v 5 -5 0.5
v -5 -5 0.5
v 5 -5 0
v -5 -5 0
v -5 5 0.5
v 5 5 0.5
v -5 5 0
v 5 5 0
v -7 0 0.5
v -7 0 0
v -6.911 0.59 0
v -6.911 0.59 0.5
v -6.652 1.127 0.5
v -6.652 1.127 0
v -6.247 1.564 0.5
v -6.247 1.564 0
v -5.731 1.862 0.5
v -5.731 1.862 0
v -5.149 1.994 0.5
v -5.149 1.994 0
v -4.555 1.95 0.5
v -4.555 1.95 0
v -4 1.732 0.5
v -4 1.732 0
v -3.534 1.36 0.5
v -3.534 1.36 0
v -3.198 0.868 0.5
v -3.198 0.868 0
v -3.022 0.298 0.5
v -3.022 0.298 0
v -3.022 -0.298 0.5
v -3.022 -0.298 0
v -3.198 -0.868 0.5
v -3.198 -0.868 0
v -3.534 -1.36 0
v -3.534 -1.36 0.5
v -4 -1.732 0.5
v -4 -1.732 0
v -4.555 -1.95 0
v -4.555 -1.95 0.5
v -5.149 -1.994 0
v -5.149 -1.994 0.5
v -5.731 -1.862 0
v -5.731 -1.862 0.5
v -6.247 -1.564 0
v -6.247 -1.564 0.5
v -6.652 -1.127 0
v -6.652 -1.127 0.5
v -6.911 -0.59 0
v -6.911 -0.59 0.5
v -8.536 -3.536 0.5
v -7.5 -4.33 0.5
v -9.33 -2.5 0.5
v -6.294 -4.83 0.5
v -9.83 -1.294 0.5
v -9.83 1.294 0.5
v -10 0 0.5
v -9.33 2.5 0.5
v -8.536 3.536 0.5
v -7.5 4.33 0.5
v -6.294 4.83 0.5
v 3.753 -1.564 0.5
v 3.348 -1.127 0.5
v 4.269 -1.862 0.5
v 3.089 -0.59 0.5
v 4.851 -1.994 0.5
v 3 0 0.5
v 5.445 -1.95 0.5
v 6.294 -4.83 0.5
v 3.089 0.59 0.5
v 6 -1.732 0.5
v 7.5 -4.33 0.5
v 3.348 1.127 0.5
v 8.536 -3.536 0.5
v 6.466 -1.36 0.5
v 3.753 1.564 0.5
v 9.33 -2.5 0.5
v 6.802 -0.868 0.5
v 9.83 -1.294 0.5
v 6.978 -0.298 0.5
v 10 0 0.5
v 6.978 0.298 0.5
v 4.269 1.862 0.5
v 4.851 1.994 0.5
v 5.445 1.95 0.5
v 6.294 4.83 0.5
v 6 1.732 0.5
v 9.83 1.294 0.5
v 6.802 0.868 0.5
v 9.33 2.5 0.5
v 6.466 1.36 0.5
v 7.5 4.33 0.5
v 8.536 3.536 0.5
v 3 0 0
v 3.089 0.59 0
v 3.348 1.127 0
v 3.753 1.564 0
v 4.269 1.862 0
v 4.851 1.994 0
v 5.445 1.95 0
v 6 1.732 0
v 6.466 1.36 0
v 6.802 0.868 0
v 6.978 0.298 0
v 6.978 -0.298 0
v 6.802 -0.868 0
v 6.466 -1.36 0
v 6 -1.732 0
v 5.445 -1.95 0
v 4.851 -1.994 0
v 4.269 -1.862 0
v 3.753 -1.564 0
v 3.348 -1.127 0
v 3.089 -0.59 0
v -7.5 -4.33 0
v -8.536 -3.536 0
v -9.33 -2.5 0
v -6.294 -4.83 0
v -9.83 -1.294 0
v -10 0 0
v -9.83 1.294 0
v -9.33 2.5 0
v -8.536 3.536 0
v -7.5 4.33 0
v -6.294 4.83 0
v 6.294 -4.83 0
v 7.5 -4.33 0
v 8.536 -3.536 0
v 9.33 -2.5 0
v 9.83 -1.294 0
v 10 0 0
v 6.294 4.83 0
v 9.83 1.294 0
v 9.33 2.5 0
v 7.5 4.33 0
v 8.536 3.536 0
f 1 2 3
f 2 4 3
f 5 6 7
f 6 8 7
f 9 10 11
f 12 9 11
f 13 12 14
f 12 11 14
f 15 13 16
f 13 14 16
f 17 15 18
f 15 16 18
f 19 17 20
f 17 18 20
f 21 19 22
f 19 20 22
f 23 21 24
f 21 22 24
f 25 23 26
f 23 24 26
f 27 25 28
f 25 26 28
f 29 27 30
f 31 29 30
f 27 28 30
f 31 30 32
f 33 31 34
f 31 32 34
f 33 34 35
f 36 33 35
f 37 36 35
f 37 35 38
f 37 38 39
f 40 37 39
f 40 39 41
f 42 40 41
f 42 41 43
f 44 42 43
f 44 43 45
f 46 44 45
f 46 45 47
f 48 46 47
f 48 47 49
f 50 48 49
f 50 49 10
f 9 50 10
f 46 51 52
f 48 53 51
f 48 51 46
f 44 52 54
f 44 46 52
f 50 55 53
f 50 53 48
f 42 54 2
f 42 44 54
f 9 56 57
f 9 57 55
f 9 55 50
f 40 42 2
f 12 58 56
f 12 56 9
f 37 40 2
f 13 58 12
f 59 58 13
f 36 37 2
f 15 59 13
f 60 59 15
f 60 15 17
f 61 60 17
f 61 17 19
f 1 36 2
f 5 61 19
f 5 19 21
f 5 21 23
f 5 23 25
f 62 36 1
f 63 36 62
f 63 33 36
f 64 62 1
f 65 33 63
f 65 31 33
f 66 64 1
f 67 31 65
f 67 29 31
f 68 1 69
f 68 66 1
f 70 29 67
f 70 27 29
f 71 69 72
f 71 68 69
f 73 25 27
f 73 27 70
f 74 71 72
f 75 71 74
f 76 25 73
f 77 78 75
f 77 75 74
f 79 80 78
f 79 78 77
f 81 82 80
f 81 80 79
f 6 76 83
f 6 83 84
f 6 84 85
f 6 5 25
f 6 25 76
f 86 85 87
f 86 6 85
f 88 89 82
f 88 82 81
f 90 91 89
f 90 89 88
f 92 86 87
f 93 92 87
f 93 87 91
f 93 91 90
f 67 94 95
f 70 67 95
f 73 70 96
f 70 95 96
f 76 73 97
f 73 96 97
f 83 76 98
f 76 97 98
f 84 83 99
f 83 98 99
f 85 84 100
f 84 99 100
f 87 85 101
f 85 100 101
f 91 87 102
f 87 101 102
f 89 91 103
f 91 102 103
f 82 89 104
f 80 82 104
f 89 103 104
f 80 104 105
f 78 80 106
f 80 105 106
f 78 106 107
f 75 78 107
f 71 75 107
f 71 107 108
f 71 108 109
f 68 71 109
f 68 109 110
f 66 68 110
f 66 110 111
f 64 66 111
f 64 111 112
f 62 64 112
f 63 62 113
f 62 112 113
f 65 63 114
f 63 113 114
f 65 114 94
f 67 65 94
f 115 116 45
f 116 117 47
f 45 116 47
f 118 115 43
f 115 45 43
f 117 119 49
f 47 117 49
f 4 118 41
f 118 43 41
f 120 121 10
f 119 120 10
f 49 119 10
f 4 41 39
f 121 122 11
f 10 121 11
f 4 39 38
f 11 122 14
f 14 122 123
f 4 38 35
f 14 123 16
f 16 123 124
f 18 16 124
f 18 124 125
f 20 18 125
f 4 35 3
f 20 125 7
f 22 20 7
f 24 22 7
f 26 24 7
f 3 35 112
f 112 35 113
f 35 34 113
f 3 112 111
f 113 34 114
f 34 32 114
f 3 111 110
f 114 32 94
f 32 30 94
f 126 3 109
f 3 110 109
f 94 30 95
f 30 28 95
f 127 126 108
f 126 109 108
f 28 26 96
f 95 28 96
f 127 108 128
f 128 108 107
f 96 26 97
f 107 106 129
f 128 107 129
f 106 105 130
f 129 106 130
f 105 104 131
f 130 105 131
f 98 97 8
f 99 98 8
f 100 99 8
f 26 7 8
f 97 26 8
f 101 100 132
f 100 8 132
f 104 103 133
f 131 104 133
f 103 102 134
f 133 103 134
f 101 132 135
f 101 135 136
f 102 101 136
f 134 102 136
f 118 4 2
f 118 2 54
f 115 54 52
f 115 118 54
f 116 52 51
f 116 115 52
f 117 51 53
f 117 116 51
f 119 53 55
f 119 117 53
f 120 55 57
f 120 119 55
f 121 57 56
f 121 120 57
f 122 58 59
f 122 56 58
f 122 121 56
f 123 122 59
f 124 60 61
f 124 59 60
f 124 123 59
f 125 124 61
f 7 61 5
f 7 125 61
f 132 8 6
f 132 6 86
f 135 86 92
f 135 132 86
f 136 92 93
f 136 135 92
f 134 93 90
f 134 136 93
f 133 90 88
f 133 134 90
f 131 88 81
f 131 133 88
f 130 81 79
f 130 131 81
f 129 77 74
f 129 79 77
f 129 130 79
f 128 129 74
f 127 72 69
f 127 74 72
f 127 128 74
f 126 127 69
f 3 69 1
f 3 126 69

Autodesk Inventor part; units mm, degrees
ref_plane "YZ Plane" through (0, 0, 0) normal (1, 0, 0) x (0, 1, 0)
ref_plane "XZ Plane" through (0, 0, 0) normal (0, 1, 0) x (-1, 0, 0)
ref_plane "XY Plane" through (0, 0, 0) normal (0, 0, 1) x (1, 0, 0)
sketch "Náčrt1" plane through (0, 0, 0) normal (0, 0, 1) x (1, 0, 0)
  line L0 (-5, 0) -> (5, 0) construction
  line L1 (-5, -5) -> (5, -5)
  line L2 (5, 5) -> (-5, 5)
  arc A0 (-5, 5) -> (-5, -5) centre (-5, 0) ccw
  arc A1 (5, -5) -> (5, 5) centre (5, 0) ccw
  point P0 (0, 0)
  point P1 (10, 0)
  dimension "d0" = 10
  dimension "d1" = 5
extrude "Vysunutí1" add sketch "Náčrt1" along normal blind 0.5
sketch "Náčrt2" plane through (0, 0, 0) normal (0, 0, -1) x (-1, 0, 0)
  arc A0 (5, -5) -> (5, 5) centre (5, 0) ccw projected
  circle A1 centre (5, 0) radius 2
  point P0 (0, 0)
  dimension "d4" = 4
extrude "Vysunutí2" cut sketch "Náčrt2" against normal through all
pattern_linear "Obdélníkové pole1" count 7 spacing 10 along (1, 0, 0) of "Vysunutí2"
properties part number "1002"
